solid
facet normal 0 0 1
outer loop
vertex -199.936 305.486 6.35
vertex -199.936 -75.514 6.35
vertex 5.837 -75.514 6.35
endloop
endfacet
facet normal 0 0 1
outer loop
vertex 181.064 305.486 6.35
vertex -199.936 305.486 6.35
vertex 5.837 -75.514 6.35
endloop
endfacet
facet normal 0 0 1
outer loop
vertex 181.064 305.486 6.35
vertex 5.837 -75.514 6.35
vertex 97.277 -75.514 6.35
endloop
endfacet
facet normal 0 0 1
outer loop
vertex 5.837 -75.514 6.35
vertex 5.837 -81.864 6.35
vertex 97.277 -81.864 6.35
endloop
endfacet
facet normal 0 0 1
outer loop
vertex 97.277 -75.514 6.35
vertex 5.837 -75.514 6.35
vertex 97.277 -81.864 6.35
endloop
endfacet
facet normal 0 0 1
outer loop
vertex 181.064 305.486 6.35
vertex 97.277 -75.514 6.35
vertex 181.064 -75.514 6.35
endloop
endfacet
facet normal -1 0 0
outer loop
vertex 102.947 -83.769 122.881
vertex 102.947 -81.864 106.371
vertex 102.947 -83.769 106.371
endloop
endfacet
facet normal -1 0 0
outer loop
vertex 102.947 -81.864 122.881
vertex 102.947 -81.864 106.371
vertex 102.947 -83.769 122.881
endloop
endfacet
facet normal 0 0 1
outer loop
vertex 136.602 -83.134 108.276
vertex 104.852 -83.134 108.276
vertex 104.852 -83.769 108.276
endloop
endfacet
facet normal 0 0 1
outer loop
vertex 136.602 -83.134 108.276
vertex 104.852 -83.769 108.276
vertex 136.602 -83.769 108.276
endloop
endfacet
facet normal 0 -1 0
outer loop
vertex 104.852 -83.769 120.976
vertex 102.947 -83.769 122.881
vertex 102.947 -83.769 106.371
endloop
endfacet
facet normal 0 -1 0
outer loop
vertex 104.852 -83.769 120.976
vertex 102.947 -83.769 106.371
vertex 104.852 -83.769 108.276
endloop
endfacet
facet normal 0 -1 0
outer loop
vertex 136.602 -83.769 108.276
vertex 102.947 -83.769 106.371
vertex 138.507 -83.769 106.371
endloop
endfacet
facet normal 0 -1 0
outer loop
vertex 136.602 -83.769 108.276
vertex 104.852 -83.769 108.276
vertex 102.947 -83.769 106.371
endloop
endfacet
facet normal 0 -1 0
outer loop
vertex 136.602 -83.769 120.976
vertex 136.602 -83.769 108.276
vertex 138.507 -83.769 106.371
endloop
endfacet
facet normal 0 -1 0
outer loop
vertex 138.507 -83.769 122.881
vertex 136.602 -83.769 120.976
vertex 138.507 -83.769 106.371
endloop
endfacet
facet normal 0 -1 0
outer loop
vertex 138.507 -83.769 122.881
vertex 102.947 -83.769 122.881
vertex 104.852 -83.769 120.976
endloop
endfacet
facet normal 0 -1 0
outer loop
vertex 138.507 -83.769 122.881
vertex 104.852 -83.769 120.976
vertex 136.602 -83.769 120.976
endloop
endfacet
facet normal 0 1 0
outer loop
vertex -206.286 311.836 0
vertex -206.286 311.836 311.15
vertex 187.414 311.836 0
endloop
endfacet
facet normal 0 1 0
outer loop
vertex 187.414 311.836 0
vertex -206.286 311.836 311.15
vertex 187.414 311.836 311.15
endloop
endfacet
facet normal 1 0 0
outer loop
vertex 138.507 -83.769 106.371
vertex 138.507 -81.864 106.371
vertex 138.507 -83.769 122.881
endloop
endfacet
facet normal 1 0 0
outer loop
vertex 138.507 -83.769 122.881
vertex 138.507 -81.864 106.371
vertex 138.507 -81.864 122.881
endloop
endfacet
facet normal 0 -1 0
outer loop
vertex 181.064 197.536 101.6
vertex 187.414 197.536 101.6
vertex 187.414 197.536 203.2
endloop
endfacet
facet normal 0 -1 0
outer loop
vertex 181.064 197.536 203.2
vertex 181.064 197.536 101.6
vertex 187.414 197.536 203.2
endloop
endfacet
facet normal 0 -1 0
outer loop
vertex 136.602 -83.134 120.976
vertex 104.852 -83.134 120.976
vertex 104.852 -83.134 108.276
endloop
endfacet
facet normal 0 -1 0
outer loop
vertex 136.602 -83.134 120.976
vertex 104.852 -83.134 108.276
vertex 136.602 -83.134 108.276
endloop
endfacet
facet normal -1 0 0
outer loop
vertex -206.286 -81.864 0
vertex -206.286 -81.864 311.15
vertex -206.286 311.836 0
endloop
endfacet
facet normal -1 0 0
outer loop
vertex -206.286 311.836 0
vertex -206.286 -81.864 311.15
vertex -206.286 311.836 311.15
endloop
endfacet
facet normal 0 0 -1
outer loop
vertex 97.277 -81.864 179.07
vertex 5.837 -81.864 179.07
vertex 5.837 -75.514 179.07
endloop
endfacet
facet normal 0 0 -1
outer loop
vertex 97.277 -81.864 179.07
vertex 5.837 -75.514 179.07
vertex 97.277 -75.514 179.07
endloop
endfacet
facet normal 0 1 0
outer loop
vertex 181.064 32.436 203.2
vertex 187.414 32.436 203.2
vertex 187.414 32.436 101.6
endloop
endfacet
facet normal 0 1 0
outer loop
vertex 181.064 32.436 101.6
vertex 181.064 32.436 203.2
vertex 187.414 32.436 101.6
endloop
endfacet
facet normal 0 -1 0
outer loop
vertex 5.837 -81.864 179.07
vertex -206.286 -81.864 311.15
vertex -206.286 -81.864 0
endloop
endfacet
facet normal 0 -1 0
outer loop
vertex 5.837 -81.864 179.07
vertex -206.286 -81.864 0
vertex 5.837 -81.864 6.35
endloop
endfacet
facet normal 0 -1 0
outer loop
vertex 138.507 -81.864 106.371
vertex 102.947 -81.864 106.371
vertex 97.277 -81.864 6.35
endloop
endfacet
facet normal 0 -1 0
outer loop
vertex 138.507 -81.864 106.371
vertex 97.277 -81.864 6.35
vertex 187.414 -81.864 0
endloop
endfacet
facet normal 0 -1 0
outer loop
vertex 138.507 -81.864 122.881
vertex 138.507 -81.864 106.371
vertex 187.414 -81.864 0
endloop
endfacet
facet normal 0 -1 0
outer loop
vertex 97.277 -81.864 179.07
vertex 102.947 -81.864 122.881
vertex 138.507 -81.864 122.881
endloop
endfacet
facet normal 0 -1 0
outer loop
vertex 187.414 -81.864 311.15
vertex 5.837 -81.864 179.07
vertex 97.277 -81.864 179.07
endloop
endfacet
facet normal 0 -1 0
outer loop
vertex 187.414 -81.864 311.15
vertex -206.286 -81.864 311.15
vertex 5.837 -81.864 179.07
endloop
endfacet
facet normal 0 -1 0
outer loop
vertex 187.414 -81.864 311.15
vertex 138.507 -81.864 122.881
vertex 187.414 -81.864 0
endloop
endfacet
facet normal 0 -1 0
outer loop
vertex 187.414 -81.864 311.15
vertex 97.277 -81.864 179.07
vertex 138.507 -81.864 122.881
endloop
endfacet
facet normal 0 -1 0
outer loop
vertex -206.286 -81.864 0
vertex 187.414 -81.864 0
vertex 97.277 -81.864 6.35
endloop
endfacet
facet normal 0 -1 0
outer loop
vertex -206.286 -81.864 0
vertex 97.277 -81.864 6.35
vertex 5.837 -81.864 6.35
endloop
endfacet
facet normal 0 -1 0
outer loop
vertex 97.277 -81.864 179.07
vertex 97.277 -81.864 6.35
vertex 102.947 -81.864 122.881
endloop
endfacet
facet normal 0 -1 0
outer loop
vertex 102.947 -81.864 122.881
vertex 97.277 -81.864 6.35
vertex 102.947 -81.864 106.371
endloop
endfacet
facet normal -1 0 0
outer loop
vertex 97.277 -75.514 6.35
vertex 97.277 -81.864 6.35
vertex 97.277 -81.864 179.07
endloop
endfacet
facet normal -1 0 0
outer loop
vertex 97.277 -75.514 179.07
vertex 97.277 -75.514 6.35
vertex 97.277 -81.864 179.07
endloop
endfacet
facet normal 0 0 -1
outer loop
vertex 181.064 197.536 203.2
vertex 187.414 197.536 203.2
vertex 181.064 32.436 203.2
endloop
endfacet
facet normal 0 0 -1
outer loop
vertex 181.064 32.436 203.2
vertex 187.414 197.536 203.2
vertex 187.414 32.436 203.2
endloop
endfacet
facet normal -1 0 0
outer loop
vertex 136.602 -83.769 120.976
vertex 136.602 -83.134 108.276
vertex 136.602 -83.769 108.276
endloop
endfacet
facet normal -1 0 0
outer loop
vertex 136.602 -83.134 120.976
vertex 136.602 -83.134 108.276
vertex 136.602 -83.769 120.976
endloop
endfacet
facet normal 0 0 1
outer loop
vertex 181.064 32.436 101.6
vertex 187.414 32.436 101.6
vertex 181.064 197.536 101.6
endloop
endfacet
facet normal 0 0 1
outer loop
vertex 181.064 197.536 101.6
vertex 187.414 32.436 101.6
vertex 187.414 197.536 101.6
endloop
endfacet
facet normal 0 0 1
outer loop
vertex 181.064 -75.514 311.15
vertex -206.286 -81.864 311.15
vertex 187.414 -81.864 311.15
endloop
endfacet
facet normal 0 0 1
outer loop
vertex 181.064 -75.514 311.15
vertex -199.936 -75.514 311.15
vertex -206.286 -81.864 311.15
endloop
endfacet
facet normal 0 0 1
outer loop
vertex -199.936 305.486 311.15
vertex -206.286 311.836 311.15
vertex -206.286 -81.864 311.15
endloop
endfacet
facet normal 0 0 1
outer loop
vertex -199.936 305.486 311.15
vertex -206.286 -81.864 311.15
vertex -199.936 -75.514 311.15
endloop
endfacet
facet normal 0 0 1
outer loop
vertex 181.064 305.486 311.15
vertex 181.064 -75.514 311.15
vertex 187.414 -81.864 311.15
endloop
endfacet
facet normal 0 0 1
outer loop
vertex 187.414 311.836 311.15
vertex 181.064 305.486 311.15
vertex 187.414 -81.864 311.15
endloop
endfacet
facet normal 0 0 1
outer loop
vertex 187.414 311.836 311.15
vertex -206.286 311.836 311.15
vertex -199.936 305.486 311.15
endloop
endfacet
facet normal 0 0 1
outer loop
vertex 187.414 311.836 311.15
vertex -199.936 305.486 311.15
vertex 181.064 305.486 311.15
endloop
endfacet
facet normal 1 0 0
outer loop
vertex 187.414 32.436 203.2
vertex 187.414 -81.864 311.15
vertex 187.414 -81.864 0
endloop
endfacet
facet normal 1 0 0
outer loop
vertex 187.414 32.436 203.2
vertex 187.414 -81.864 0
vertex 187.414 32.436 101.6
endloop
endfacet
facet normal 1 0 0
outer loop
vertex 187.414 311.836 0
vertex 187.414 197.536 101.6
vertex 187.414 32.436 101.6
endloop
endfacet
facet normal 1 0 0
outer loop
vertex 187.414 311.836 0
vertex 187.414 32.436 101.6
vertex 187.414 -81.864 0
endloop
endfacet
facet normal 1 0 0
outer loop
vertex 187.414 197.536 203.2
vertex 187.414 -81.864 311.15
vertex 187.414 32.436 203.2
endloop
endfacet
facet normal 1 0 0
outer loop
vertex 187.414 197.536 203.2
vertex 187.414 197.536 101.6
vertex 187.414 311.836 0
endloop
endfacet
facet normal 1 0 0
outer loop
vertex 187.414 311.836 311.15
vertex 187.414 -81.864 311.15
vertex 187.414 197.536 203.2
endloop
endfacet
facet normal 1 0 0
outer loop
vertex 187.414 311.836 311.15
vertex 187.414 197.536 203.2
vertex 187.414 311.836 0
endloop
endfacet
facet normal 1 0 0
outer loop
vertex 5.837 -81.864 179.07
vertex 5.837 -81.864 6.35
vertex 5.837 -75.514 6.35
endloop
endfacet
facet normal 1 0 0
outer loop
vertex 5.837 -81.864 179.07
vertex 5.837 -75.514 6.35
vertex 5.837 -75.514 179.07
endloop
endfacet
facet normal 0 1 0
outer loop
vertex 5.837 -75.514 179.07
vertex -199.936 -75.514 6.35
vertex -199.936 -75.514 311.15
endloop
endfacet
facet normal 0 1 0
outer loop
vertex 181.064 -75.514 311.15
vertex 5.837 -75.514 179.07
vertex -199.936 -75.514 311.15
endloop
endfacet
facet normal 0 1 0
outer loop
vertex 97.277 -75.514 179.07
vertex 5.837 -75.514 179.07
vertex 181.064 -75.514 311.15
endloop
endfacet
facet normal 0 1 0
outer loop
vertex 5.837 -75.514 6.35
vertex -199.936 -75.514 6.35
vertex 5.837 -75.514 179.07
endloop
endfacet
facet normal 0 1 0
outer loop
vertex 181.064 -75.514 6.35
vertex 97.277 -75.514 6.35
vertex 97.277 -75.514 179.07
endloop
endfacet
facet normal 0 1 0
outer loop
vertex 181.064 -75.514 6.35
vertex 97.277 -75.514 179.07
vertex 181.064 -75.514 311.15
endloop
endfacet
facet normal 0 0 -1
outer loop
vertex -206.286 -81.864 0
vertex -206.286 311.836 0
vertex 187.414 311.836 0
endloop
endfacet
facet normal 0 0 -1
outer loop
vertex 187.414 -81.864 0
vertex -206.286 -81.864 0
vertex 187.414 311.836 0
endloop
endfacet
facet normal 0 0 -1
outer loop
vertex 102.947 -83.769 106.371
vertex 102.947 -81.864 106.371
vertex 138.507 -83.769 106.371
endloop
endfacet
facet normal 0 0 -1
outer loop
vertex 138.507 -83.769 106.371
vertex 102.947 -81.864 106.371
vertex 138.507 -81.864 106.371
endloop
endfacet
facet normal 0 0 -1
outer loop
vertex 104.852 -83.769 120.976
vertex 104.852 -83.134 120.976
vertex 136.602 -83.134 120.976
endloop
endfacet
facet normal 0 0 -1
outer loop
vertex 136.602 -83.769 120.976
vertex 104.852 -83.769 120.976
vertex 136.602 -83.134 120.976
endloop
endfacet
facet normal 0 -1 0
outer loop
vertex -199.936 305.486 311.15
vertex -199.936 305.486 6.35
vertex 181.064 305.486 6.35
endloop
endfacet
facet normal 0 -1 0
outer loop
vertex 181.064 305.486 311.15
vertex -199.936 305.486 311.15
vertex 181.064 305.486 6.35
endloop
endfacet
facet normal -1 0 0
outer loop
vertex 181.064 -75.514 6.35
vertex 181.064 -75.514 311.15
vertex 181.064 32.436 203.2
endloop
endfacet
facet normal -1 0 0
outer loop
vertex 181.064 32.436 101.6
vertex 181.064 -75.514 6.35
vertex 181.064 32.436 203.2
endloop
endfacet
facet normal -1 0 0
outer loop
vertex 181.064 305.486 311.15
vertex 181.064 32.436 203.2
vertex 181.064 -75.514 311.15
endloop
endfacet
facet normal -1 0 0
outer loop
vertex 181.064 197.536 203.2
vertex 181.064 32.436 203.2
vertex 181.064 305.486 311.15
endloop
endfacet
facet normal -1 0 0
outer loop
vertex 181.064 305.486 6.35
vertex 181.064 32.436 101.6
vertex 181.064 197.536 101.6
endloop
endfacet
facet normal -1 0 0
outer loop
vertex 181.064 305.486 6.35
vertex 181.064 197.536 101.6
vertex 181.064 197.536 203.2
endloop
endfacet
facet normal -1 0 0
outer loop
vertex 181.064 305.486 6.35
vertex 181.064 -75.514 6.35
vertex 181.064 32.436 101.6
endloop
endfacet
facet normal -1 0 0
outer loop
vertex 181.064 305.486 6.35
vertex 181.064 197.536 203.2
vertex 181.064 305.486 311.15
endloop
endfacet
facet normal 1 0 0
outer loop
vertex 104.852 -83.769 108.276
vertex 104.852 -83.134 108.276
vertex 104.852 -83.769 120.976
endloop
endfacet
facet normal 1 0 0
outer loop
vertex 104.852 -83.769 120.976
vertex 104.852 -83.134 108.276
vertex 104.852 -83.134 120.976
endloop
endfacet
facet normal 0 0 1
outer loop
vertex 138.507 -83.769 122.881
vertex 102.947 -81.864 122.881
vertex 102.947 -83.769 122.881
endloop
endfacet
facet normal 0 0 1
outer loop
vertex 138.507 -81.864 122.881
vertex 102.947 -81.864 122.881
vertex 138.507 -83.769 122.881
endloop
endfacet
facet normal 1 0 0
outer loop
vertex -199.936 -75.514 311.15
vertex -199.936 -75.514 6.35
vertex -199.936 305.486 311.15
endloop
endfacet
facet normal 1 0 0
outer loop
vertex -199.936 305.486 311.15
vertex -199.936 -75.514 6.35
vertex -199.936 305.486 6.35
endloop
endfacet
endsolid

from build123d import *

# Parameters (mm, degrees)
F0_W          = 381
F0_H          = 381
F1_DEPTH      = 6.35
F2_W          = 393.7
F2_H          = 393.7
F2_W_2        = 381
F2_H_2        = 381
F3_DEPTH      = 304.8
F3_DEPTH_BACK = 6.35
F4_W          = 91.44
F4_H          = 172.72
F5_DEPTH      = 25.4
F6_W          = 165.1
F6_H          = 50.8
F7_DEPTH      = 25.4
F8_W          = 31.75
F8_H          = 12.7
F9_DEPTH      = 1.27
F8_W_2        = 35.56
F8_H_2        = 16.51
F10_DEPTH     = 1.905


with BuildPart() as f1:
    # F0 (on Top) → F1 (new body)
    with BuildSketch(Plane.XY):
        with Locations((-9.435589, 114.986119)):
            Rectangle(F0_W, F0_H)
    extrude(amount=F1_DEPTH)

    # F2 (on face) → F3 (join, two sides)
    with BuildSketch(Plane.XY.offset(6.35)) as f3_sk:
        with Locations((-9.435589, 114.986119)):
            Rectangle(F2_W, F2_H)
        with Locations((-9.435589, 114.986119)):
            Rectangle(F2_W_2, F2_H_2, mode=Mode.SUBTRACT)
    extrude(amount=F3_DEPTH)
    extrude(f3_sk.sketch, amount=-F3_DEPTH_BACK)

    # F4 (on face) → F5 (cut)
    with BuildSketch(Plane.XZ.offset(81.863881)):
        with Locations((51.556636, 92.71)):
            Rectangle(F4_W, F4_H)
    extrude(amount=-F5_DEPTH, mode=Mode.SUBTRACT)

    # F6 (on face) → F7 (cut)
    with BuildSketch(Plane.YZ.offset(187.414411)):
        Polygon((32.436119, 155.575), (32.436119, 152.4), (197.536119, 152.4), (197.536119, 203.2), (32.436119, 203.2), align=None)
        with Locations((114.986119, 127)):
            Rectangle(F6_W, F6_H)
    extrude(amount=-F7_DEPTH, mode=Mode.SUBTRACT)

    # F8 (on face) → F9 (join)
    with BuildSketch(Plane.XZ.offset(81.863881)):
        with Locations((120.726646, 114.625568)):
            Rectangle(F8_W, F8_H)
    extrude(amount=F9_DEPTH)

    # F8 (on face) → F10 (join)
    with BuildSketch(Plane.XZ.offset(81.863881)):
        with Locations((120.726646, 114.625568)):
            Rectangle(F8_W_2, F8_H_2)
        with Locations((120.726646, 114.625568)):
            Rectangle(F8_W, F8_H, mode=Mode.SUBTRACT)
    extrude(amount=F10_DEPTH)


solid = f1.part
